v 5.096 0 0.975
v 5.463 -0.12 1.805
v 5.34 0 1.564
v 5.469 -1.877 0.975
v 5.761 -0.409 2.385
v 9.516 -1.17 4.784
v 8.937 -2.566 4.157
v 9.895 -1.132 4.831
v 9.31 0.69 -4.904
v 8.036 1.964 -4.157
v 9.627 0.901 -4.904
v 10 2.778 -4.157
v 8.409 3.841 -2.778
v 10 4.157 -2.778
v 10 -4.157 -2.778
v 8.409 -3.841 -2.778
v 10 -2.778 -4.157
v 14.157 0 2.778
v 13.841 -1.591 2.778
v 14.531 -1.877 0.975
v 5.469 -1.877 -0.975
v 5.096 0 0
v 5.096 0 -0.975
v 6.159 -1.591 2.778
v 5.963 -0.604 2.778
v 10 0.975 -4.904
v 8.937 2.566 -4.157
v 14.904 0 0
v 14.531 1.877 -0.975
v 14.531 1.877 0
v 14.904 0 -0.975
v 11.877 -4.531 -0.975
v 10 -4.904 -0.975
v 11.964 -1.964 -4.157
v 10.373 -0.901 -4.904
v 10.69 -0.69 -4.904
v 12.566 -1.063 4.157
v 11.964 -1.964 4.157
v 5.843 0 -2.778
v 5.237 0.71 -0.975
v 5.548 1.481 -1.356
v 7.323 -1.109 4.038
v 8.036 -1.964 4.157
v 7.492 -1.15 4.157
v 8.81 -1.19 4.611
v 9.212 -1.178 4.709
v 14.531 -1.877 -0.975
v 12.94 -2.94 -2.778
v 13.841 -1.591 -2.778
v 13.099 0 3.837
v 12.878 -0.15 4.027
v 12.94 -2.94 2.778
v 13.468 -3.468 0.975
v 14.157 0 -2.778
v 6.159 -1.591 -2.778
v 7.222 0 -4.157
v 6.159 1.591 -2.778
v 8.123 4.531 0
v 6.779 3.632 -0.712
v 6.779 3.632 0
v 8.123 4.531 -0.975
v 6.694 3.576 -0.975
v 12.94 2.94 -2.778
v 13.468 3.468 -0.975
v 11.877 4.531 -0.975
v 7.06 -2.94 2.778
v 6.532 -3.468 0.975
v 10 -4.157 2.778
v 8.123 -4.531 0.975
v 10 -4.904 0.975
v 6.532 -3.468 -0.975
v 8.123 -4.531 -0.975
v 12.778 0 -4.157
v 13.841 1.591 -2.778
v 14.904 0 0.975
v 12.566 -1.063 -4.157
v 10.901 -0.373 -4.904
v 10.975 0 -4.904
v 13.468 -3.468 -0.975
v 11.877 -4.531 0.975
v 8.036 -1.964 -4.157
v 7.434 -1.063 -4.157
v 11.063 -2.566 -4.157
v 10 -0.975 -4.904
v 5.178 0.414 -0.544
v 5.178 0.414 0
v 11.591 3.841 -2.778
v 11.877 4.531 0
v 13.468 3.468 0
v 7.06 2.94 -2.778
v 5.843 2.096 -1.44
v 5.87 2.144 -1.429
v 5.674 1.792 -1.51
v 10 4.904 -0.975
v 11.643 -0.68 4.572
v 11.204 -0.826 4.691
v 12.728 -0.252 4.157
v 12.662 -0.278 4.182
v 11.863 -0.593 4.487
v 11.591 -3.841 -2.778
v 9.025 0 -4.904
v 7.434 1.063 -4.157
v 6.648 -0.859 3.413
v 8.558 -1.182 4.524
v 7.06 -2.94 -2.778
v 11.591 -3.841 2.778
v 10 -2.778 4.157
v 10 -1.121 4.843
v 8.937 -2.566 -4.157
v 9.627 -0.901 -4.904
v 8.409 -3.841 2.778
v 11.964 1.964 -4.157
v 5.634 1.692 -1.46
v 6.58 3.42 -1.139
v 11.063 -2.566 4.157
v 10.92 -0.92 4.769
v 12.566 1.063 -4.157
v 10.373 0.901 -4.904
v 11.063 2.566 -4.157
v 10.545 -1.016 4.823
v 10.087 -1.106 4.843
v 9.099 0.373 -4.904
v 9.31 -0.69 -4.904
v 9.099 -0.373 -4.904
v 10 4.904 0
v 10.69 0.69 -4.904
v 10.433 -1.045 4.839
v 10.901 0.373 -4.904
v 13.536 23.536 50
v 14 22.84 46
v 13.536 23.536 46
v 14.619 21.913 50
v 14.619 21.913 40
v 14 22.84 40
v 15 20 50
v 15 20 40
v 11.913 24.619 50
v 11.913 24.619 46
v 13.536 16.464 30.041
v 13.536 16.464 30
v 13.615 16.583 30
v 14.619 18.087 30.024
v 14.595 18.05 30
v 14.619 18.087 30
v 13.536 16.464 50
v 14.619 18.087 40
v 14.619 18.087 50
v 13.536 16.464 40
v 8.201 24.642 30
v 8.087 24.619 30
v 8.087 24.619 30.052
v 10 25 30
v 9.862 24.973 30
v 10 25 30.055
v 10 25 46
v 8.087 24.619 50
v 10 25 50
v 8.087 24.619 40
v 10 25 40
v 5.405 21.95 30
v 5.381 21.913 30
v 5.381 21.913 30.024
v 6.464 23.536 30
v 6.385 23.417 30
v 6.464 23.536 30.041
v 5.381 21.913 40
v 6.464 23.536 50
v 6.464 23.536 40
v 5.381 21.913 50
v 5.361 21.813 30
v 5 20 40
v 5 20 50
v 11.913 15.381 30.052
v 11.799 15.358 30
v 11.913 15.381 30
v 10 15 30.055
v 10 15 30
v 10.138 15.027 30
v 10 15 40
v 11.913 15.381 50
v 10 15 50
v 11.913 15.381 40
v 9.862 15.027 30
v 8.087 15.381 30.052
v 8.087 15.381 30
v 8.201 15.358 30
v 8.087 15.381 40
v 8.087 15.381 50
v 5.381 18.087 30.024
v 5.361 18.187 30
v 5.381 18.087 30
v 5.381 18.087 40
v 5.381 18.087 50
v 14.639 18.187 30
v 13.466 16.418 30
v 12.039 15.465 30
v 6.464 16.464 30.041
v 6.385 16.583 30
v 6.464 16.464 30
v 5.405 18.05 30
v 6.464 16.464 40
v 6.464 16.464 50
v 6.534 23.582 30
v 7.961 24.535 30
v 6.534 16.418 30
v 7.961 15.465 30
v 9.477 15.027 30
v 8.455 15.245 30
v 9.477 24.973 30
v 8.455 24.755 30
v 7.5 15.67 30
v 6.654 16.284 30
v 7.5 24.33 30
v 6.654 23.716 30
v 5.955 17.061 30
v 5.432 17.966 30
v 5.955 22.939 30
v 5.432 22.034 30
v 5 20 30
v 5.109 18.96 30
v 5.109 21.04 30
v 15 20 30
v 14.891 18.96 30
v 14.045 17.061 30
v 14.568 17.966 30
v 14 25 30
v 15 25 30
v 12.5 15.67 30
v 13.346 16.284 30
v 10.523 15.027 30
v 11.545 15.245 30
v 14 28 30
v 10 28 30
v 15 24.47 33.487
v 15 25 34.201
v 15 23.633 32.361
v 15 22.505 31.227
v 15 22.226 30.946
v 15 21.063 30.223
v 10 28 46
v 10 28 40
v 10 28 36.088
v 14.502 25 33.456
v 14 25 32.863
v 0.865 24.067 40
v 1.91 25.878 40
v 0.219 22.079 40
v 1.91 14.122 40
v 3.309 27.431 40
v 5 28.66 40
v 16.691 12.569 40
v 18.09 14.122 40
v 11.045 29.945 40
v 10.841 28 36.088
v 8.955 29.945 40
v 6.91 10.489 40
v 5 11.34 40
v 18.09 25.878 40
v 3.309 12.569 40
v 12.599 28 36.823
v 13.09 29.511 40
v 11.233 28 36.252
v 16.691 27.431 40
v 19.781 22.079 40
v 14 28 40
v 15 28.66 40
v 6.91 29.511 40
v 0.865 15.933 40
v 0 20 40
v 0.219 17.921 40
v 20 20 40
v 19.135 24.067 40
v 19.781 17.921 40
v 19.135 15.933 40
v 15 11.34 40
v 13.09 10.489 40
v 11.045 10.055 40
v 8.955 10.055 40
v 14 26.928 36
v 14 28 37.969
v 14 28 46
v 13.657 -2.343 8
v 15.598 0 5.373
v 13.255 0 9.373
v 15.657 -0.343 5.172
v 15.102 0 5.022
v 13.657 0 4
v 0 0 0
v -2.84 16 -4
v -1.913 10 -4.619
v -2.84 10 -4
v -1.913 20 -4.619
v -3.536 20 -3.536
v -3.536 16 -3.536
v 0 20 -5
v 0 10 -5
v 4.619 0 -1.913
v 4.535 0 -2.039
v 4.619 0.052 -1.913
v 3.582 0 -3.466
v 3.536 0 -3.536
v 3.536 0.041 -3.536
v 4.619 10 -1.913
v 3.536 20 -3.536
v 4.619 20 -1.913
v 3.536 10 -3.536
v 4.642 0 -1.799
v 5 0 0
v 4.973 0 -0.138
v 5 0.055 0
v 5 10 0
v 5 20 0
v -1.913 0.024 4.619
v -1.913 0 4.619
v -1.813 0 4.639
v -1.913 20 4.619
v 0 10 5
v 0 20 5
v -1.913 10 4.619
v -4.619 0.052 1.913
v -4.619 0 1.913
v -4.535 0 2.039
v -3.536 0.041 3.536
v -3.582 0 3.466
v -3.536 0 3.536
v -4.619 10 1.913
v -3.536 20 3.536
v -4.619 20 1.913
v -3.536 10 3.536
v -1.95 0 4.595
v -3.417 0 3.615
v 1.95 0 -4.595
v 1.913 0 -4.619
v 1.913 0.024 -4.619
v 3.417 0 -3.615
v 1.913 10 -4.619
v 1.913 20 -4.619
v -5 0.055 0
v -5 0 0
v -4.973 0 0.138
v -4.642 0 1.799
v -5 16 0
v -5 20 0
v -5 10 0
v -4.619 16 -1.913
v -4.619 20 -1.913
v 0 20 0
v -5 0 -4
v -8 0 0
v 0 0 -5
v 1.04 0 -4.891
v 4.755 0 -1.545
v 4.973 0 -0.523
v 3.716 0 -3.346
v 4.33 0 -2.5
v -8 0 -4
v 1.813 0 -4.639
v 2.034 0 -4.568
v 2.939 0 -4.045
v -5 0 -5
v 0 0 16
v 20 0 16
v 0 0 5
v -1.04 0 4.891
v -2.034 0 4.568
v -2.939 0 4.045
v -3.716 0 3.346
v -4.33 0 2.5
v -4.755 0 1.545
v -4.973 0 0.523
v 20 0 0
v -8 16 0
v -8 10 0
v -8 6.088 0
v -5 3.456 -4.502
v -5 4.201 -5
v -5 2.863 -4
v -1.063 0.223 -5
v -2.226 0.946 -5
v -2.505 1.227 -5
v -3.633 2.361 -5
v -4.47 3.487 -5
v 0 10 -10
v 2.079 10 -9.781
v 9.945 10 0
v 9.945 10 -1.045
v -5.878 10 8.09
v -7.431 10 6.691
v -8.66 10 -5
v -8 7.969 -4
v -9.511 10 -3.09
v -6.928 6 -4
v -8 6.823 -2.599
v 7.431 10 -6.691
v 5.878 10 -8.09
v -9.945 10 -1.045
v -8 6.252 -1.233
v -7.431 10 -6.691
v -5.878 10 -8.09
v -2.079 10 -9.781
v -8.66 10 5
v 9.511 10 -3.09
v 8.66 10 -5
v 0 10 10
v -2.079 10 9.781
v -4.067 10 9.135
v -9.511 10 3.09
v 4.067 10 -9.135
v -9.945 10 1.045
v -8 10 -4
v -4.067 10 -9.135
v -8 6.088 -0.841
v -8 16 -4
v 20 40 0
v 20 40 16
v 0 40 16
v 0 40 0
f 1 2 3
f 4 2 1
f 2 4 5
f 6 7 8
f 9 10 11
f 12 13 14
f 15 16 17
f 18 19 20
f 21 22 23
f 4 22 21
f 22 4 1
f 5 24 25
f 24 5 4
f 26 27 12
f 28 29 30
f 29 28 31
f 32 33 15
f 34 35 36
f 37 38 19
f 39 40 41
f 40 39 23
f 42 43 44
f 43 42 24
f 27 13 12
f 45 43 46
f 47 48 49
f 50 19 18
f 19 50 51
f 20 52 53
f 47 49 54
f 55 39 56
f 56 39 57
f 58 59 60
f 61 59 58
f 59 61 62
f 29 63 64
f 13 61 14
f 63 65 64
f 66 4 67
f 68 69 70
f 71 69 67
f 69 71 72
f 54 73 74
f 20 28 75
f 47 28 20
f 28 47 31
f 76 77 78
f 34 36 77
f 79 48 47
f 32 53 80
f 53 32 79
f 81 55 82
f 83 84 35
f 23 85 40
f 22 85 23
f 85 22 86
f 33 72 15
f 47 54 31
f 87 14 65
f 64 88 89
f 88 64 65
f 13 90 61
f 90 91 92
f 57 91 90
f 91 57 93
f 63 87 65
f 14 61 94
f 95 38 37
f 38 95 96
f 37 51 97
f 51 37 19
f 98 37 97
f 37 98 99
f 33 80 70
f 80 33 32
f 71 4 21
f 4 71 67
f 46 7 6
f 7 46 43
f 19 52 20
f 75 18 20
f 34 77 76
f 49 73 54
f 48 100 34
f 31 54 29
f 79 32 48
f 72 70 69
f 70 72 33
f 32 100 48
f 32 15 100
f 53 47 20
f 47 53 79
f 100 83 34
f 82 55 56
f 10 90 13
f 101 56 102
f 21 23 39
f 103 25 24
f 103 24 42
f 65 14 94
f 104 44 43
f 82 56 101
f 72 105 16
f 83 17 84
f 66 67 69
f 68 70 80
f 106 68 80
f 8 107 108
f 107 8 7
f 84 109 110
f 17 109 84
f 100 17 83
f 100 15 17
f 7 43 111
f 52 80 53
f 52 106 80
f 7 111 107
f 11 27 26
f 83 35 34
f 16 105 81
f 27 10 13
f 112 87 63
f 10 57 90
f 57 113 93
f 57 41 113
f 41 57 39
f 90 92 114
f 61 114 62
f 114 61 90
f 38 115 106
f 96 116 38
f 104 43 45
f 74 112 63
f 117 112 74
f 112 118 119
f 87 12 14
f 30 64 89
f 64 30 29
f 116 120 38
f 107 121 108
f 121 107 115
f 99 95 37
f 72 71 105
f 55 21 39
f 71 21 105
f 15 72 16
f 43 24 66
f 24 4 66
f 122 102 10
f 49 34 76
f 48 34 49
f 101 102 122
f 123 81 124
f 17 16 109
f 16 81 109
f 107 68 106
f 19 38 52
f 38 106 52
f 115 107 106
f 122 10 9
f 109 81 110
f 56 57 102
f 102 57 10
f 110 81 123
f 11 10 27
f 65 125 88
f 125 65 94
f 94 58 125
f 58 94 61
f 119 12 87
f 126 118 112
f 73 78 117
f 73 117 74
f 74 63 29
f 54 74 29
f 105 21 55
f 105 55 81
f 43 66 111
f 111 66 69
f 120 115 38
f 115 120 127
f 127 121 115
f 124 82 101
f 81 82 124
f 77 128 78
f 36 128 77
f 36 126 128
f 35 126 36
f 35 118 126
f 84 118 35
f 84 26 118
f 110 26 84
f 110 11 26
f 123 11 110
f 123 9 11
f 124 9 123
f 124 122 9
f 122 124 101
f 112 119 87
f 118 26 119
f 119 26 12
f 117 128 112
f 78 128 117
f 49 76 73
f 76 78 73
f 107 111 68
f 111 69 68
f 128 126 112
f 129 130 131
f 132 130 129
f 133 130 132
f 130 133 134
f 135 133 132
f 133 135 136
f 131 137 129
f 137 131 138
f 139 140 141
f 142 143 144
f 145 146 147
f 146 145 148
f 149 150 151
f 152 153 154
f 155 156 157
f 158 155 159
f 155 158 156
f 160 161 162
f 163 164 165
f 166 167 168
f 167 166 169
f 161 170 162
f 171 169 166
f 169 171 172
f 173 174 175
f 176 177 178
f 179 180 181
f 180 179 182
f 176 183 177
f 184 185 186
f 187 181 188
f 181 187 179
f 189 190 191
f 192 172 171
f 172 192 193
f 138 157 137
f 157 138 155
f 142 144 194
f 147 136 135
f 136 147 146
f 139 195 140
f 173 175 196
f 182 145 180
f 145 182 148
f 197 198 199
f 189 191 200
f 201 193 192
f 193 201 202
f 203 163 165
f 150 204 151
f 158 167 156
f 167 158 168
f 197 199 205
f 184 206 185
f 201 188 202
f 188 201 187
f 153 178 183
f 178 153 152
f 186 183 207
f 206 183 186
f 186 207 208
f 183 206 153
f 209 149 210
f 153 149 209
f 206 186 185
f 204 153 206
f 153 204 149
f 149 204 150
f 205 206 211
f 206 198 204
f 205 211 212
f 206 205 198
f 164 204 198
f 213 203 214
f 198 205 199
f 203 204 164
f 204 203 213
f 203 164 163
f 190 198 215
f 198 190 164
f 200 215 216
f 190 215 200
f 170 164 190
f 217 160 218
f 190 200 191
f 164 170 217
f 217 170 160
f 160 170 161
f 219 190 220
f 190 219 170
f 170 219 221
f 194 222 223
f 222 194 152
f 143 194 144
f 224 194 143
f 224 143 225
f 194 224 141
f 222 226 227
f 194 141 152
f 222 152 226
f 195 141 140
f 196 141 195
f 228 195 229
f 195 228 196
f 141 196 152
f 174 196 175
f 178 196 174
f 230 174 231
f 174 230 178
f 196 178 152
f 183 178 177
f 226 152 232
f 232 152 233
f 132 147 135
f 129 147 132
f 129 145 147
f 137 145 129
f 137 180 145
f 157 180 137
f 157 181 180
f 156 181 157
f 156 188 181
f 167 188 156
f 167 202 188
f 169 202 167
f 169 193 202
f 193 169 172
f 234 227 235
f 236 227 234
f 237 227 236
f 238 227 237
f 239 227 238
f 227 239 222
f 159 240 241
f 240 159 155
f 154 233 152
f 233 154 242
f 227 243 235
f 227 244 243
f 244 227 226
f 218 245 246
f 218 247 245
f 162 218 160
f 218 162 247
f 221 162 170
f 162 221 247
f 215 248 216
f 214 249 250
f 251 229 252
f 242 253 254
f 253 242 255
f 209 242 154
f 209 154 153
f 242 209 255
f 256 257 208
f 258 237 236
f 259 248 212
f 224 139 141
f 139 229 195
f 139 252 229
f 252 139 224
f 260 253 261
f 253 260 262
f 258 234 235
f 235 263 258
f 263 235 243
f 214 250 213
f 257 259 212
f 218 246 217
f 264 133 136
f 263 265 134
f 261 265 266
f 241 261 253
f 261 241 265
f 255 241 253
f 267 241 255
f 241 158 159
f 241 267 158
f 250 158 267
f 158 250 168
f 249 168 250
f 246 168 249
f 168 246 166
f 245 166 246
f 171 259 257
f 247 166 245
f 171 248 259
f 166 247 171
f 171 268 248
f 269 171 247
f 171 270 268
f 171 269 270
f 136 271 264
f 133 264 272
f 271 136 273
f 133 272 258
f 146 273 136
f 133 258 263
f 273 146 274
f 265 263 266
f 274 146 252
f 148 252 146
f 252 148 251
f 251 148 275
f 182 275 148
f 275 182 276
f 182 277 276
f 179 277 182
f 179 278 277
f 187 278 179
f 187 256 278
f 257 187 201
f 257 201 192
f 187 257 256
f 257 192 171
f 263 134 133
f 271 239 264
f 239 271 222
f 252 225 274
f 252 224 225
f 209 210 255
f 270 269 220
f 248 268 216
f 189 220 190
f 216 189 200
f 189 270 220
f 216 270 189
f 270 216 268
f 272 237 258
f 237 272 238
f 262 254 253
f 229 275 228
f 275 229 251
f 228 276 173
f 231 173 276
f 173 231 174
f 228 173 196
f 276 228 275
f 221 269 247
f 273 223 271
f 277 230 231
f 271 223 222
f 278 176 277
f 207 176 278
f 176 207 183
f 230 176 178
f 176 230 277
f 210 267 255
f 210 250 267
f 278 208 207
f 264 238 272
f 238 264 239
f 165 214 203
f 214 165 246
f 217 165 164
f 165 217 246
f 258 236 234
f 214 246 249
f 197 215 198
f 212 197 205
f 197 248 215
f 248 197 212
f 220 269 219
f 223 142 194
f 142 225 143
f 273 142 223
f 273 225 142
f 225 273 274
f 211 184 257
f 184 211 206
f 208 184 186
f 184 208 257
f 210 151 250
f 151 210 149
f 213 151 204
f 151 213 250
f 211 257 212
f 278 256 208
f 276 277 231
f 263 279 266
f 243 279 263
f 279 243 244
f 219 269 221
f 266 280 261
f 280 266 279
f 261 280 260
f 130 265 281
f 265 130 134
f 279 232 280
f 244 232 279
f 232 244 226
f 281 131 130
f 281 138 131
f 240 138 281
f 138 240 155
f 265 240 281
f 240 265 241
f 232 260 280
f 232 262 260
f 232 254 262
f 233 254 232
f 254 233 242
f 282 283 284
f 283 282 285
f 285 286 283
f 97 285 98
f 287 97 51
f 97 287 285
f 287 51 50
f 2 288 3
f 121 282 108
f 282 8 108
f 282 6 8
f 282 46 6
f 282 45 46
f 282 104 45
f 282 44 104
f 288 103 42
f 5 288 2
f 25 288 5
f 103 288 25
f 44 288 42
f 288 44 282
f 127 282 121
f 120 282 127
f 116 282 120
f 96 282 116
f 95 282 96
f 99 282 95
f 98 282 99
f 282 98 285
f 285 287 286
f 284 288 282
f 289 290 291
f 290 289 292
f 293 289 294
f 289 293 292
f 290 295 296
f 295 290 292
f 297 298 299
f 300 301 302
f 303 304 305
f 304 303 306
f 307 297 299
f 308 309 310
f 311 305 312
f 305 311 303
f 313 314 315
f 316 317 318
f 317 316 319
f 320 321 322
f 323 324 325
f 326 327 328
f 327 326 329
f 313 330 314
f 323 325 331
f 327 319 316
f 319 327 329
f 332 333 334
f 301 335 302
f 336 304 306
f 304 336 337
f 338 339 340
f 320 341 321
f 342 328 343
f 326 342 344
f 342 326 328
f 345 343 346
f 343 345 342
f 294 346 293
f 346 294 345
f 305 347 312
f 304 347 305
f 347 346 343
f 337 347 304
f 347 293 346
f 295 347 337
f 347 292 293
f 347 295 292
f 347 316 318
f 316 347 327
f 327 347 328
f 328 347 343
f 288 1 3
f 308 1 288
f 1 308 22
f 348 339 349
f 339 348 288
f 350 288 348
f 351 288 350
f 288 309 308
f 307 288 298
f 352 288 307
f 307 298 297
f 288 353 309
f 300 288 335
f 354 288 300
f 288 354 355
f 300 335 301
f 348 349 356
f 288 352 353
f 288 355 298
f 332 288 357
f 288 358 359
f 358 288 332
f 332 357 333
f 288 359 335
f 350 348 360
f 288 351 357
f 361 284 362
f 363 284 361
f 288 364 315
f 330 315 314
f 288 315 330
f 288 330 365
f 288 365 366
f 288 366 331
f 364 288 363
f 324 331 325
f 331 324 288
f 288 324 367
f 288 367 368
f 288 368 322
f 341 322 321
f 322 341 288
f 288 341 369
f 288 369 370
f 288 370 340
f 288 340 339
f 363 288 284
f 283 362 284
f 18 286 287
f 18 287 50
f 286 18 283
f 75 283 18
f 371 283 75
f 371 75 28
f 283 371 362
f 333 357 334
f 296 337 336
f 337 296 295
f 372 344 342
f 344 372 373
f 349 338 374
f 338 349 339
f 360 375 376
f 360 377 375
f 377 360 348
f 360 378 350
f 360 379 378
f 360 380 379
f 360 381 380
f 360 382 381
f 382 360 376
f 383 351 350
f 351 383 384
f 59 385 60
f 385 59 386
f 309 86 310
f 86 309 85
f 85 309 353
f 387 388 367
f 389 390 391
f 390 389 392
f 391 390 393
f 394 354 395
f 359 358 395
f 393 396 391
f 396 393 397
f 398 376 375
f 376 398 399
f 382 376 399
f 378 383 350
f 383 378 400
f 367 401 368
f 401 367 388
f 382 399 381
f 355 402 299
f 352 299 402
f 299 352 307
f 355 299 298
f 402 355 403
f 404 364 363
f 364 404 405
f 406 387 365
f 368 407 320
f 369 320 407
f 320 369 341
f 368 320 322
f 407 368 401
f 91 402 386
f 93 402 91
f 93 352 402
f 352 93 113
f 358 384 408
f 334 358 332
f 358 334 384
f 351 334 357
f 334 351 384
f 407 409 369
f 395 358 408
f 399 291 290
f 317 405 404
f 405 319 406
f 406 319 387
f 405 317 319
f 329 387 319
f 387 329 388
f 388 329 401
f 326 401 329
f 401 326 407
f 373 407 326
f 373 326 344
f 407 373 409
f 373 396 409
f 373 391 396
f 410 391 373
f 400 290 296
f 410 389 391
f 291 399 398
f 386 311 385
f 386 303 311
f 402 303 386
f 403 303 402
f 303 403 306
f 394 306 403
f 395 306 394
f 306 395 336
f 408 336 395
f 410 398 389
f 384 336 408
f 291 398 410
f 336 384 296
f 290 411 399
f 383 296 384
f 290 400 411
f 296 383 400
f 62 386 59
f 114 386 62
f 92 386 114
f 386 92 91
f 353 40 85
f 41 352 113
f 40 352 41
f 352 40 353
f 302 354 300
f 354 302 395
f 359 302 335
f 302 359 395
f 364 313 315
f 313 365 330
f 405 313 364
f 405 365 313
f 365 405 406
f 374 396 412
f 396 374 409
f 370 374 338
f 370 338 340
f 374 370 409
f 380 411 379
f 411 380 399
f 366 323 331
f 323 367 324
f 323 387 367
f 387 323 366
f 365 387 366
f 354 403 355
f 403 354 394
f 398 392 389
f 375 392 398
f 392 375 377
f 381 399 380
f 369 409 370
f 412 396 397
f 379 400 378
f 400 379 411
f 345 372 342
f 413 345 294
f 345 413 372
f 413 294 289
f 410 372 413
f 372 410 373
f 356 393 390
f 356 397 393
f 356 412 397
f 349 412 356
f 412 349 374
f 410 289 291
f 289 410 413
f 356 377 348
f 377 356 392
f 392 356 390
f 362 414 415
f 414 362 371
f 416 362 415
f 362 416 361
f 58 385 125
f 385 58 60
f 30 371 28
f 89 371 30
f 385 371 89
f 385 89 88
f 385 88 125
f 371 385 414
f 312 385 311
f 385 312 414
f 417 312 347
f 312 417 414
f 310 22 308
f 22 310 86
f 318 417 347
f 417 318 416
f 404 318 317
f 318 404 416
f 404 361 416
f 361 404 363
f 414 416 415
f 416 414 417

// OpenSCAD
translate([10,0,0]) sphere(r=5);

translate([10,20,30]) cylinder(20,5,5);
translate([10,20,30]) cube(5);
translate([10,20,30]) cylinder(10,5,10);
translate([10,20,30]) cylinder(20,5,0);
translate([10,20,30]) cube([4,8,16]);

rotate ([45,45,45]) cube([4,8,16]);

rotate([45,90,135]) cylinder(20,5,5);
rotate([45,90,135]) cube(5);
rotate([45,90,135]) cylinder(10,5,10);
rotate([45,90,135]) cylinder(20,5,0);
rotate([45,90,135]) cube([4,8,16]);

scale ([5,5,1]) cube([4,8,16]);
